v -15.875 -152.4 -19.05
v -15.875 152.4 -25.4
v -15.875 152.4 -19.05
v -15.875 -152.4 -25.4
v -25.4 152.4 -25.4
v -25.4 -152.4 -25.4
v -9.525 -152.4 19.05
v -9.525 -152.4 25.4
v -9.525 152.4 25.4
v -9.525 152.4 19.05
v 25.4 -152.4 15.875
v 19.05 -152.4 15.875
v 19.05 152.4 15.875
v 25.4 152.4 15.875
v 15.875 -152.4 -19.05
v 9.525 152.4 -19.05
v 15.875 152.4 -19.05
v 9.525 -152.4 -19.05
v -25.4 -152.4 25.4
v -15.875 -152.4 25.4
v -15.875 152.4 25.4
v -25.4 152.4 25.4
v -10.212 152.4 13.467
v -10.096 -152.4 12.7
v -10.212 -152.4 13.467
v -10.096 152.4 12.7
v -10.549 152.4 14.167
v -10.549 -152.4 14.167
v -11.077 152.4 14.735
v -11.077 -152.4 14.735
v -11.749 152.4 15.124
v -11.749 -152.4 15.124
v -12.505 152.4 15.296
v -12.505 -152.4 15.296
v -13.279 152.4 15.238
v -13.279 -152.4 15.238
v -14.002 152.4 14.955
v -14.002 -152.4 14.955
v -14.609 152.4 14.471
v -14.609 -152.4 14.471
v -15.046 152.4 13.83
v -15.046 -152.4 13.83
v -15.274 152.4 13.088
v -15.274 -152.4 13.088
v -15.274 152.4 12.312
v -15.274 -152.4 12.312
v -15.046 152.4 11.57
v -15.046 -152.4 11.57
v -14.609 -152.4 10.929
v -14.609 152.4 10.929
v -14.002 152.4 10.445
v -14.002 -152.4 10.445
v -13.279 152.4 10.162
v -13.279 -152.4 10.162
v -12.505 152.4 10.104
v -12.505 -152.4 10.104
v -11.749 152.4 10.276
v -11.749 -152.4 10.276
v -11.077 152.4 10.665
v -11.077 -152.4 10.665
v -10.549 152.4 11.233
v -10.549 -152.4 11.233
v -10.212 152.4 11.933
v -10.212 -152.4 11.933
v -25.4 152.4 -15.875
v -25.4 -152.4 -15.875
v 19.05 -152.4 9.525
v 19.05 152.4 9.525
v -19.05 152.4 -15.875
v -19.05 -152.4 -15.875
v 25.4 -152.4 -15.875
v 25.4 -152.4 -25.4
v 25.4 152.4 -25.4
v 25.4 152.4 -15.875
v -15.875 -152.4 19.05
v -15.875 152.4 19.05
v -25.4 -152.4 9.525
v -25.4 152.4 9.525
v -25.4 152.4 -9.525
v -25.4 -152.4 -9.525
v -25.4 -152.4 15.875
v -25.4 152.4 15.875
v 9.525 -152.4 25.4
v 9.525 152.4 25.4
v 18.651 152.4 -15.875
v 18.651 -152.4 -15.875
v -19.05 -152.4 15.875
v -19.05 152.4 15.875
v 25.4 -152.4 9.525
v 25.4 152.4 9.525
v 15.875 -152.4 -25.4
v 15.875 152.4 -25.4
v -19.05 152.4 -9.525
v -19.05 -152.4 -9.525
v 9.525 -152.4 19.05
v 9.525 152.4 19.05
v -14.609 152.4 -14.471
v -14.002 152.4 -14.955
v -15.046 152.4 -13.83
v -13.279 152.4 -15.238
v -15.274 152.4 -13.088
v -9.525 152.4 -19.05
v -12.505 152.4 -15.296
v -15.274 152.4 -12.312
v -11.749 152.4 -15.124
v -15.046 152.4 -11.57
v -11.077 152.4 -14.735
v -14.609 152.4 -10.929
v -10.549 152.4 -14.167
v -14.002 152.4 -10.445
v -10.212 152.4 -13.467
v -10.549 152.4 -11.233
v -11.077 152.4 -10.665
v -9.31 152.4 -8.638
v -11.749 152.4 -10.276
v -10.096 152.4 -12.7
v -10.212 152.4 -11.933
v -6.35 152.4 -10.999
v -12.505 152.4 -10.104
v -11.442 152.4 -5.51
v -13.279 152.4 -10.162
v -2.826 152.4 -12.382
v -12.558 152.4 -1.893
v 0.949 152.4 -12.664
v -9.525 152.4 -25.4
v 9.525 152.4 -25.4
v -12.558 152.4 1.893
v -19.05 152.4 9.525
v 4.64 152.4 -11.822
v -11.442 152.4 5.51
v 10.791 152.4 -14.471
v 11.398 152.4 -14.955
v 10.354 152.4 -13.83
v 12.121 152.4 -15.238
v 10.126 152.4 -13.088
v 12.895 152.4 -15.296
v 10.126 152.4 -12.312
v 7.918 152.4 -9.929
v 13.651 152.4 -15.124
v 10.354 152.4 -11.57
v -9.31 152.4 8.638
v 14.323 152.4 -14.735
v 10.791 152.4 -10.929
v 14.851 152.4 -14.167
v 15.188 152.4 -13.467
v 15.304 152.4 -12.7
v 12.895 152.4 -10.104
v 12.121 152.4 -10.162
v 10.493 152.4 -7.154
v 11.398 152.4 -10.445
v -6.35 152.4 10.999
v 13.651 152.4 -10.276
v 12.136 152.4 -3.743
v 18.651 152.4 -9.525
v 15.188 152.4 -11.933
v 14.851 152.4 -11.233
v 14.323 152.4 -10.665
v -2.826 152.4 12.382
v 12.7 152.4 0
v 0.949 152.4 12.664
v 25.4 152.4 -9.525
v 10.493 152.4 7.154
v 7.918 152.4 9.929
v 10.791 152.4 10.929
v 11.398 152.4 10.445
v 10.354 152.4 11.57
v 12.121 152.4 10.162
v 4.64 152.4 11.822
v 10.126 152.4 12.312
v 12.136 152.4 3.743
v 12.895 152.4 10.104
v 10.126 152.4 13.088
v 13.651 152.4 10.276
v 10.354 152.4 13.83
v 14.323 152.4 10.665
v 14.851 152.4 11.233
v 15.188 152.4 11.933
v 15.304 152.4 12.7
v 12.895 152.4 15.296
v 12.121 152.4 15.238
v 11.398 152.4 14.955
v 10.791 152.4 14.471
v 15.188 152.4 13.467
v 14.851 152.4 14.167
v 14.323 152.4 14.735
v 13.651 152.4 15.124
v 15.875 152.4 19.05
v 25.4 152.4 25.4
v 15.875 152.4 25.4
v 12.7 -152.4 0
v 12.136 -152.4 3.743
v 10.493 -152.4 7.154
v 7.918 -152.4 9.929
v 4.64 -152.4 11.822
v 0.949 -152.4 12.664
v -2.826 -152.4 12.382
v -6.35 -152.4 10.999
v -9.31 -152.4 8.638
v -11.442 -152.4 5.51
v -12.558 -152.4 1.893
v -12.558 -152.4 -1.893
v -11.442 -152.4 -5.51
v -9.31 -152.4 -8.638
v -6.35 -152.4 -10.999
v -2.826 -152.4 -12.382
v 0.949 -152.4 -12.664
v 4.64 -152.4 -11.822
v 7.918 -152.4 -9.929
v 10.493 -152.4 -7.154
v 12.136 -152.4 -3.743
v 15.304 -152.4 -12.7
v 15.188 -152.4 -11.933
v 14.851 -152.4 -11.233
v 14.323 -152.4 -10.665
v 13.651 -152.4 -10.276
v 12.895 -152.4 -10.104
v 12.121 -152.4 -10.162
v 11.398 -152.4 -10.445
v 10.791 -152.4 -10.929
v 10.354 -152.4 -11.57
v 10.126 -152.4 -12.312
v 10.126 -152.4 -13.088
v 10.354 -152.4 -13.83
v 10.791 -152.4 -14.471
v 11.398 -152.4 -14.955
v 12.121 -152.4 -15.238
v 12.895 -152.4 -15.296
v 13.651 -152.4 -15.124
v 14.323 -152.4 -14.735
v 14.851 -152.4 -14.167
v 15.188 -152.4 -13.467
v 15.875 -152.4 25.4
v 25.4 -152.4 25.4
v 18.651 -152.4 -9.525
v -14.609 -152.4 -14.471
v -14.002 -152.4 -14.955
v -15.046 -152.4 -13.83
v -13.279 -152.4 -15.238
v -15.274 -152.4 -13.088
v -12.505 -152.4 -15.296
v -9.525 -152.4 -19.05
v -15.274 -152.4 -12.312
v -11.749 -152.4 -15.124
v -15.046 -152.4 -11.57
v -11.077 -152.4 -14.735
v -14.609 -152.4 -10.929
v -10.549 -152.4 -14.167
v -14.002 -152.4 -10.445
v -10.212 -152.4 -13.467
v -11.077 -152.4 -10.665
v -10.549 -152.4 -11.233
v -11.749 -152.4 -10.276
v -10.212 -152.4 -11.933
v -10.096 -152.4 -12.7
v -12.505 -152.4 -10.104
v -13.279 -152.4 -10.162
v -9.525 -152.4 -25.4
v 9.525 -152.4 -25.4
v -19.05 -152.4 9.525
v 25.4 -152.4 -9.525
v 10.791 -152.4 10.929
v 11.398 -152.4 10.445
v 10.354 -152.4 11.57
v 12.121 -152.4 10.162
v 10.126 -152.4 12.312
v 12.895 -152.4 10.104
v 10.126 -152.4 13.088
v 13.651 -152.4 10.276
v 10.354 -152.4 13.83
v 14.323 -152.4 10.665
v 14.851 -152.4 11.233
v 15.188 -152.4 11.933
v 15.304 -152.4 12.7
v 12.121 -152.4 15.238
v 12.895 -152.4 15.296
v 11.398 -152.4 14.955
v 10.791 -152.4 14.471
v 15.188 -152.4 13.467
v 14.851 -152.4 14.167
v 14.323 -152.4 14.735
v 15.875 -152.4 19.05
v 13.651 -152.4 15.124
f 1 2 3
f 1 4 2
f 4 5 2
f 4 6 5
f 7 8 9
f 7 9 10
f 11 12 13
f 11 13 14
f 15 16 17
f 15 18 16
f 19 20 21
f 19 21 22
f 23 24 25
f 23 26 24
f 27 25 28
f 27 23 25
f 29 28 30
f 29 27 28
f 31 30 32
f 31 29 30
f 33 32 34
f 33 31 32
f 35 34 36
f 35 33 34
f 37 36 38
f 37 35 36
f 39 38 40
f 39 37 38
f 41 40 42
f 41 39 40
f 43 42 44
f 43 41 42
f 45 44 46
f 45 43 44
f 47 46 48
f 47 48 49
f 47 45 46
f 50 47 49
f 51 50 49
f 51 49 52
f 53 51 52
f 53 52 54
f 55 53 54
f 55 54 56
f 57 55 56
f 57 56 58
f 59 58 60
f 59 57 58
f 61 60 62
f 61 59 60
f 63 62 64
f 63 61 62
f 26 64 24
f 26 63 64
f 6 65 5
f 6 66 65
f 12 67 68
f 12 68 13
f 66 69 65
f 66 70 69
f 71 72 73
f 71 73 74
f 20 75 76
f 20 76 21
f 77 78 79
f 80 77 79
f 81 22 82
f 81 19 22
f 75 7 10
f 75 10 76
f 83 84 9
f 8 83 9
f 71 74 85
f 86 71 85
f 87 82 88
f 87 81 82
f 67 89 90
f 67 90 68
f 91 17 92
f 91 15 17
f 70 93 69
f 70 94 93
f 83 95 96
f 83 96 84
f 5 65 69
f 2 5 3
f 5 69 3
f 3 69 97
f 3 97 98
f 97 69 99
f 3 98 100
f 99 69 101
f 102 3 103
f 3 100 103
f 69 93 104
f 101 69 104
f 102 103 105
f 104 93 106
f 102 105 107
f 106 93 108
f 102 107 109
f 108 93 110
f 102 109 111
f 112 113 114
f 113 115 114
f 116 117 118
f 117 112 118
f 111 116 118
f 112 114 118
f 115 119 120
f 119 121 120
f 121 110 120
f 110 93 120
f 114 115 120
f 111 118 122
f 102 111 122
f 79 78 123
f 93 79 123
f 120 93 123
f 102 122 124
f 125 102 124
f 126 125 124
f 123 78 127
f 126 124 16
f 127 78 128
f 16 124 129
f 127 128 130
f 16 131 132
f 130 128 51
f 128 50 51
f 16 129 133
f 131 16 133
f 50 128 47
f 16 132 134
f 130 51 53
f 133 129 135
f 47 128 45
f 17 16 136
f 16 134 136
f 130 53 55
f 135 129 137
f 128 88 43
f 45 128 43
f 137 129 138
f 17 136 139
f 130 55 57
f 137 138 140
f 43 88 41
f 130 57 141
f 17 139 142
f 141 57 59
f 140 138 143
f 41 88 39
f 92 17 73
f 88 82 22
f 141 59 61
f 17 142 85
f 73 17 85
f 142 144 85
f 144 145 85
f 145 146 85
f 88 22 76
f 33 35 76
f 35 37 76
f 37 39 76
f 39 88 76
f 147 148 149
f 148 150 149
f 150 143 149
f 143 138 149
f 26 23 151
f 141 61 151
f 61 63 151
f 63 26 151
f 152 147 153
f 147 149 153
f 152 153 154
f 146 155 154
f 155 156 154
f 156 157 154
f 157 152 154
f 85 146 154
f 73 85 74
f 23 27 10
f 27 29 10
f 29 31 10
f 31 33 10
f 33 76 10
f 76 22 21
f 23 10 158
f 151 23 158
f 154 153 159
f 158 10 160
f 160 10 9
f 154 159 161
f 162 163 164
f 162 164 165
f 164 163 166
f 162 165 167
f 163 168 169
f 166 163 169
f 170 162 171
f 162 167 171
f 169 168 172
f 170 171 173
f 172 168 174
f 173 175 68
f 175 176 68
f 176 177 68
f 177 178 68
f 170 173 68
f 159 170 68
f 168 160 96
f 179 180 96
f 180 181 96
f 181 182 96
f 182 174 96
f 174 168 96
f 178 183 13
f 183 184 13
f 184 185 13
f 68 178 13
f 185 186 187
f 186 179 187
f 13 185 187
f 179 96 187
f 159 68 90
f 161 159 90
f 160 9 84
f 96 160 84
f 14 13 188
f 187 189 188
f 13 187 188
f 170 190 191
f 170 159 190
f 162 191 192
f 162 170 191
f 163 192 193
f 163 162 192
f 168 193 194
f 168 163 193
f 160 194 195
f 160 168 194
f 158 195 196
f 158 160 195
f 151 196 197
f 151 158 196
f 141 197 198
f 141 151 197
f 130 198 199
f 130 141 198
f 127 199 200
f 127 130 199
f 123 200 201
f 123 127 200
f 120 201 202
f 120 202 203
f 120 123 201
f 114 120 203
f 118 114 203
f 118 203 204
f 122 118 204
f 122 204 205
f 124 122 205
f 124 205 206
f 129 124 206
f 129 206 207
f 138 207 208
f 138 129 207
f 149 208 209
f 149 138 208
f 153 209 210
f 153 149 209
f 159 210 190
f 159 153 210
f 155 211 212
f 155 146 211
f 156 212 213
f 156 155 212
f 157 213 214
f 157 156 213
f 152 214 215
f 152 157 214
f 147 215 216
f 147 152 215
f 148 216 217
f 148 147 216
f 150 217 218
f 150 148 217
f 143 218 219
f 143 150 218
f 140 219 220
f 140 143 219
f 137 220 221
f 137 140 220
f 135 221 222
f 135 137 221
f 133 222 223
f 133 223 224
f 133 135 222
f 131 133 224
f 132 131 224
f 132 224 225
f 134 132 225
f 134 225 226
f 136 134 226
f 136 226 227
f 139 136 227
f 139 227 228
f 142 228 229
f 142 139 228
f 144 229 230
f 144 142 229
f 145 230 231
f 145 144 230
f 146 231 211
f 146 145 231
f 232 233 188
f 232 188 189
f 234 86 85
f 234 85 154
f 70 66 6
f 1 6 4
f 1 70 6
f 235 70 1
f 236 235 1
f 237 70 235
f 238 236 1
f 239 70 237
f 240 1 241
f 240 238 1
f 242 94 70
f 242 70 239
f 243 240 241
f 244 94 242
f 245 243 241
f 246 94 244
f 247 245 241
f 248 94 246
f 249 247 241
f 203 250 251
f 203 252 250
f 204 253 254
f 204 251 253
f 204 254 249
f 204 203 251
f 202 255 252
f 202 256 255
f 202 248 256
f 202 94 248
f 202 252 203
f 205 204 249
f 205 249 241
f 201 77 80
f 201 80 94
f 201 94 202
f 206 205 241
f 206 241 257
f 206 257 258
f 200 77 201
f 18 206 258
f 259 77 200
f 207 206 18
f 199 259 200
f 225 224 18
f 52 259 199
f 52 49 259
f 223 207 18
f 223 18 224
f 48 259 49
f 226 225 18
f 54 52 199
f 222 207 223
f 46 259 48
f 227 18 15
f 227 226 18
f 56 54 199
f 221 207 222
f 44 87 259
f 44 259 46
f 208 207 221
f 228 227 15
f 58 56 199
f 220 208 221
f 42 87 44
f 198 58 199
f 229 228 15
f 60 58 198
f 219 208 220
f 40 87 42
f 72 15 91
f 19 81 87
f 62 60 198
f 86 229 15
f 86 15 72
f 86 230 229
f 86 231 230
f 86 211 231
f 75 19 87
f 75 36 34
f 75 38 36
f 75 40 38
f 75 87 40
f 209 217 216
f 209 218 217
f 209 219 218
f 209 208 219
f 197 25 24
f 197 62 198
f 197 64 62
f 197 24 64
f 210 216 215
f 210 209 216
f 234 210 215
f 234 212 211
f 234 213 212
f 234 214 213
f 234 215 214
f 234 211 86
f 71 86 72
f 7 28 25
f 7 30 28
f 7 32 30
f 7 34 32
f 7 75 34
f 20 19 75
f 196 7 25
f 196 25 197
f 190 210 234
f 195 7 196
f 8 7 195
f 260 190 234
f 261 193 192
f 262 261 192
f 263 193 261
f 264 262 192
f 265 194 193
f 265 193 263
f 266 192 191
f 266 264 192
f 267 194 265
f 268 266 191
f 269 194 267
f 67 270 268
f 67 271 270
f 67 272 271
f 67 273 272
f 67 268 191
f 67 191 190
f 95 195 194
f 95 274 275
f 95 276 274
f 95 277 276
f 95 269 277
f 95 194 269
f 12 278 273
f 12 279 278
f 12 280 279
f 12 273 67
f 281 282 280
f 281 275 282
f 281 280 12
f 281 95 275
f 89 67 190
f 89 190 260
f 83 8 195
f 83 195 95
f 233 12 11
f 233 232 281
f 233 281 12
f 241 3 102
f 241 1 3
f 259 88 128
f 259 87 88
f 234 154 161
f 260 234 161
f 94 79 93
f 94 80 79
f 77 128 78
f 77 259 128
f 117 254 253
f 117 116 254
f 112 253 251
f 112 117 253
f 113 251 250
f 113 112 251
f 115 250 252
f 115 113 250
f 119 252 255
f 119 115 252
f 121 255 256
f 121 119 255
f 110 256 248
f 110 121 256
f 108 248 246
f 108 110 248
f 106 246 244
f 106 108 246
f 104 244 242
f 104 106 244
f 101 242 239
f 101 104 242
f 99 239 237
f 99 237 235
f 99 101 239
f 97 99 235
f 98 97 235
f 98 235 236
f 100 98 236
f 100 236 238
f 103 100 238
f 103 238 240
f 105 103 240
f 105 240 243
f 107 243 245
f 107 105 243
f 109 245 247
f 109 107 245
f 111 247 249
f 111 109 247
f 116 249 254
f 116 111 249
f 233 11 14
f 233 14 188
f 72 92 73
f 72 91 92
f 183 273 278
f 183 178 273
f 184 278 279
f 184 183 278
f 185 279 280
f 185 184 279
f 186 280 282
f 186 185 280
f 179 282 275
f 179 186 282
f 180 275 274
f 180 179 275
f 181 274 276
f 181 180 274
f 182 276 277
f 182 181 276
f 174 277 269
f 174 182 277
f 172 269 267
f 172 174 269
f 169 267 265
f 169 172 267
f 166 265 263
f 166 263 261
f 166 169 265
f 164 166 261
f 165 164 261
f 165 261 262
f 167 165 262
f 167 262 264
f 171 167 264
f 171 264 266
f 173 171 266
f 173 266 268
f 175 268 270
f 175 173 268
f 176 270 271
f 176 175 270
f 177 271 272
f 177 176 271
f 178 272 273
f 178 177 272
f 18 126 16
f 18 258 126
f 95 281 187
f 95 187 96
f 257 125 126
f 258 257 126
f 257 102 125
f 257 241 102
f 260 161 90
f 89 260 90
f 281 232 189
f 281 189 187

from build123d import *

# Parameters (mm, degrees)
F0_R     = 2.6035
F0_R_2   = 12.7
F1_DEPTH = 152.4


with BuildPart() as f1:
    # F0 (on Front) → F1 (new body, symmetric)
    with BuildSketch(Plane.XZ):
        Polygon((15.875, -25.4), (25.4, -25.4), (25.4, -15.875), (18.651077, -15.875), (18.651077, -9.525), (25.4, -9.525), (25.4, 9.525), (19.05, 9.525), (19.05, 15.875), (25.4, 15.875), (25.4, 25.4), (15.875, 25.4), (15.875, 19.05), (9.525, 19.05), (9.525, 25.4), (-9.525, 25.4), (-9.525, 19.05), (-15.875, 19.05), (-15.875, 25.4), (-25.4, 25.4), (-25.4, 15.875), (-19.05, 15.875), (-19.05, 9.525), (-25.4, 9.525), (-25.4, -9.525), (-19.05, -9.525), (-19.05, -15.875), (-25.4, -15.875), (-25.4, -25.4), (-15.875, -25.4), (-15.875, -19.05), (-9.525, -19.05), (-9.525, -25.4), (9.525, -25.4), (9.525, -19.05), (15.875, -19.05), align=None)
        with Locations((-12.7, -12.7)):
            Circle(F0_R, mode=Mode.SUBTRACT)
        Circle(F0_R_2, mode=Mode.SUBTRACT)
        with Locations((12.7, -12.7)):
            Circle(F0_R, mode=Mode.SUBTRACT)
        with Locations((-12.7, 12.7)):
            Circle(F0_R, mode=Mode.SUBTRACT)
        with Locations((12.7, 12.7)):
            Circle(F0_R, mode=Mode.SUBTRACT)
    extrude(amount=F1_DEPTH, both=True)


solid = f1.part
